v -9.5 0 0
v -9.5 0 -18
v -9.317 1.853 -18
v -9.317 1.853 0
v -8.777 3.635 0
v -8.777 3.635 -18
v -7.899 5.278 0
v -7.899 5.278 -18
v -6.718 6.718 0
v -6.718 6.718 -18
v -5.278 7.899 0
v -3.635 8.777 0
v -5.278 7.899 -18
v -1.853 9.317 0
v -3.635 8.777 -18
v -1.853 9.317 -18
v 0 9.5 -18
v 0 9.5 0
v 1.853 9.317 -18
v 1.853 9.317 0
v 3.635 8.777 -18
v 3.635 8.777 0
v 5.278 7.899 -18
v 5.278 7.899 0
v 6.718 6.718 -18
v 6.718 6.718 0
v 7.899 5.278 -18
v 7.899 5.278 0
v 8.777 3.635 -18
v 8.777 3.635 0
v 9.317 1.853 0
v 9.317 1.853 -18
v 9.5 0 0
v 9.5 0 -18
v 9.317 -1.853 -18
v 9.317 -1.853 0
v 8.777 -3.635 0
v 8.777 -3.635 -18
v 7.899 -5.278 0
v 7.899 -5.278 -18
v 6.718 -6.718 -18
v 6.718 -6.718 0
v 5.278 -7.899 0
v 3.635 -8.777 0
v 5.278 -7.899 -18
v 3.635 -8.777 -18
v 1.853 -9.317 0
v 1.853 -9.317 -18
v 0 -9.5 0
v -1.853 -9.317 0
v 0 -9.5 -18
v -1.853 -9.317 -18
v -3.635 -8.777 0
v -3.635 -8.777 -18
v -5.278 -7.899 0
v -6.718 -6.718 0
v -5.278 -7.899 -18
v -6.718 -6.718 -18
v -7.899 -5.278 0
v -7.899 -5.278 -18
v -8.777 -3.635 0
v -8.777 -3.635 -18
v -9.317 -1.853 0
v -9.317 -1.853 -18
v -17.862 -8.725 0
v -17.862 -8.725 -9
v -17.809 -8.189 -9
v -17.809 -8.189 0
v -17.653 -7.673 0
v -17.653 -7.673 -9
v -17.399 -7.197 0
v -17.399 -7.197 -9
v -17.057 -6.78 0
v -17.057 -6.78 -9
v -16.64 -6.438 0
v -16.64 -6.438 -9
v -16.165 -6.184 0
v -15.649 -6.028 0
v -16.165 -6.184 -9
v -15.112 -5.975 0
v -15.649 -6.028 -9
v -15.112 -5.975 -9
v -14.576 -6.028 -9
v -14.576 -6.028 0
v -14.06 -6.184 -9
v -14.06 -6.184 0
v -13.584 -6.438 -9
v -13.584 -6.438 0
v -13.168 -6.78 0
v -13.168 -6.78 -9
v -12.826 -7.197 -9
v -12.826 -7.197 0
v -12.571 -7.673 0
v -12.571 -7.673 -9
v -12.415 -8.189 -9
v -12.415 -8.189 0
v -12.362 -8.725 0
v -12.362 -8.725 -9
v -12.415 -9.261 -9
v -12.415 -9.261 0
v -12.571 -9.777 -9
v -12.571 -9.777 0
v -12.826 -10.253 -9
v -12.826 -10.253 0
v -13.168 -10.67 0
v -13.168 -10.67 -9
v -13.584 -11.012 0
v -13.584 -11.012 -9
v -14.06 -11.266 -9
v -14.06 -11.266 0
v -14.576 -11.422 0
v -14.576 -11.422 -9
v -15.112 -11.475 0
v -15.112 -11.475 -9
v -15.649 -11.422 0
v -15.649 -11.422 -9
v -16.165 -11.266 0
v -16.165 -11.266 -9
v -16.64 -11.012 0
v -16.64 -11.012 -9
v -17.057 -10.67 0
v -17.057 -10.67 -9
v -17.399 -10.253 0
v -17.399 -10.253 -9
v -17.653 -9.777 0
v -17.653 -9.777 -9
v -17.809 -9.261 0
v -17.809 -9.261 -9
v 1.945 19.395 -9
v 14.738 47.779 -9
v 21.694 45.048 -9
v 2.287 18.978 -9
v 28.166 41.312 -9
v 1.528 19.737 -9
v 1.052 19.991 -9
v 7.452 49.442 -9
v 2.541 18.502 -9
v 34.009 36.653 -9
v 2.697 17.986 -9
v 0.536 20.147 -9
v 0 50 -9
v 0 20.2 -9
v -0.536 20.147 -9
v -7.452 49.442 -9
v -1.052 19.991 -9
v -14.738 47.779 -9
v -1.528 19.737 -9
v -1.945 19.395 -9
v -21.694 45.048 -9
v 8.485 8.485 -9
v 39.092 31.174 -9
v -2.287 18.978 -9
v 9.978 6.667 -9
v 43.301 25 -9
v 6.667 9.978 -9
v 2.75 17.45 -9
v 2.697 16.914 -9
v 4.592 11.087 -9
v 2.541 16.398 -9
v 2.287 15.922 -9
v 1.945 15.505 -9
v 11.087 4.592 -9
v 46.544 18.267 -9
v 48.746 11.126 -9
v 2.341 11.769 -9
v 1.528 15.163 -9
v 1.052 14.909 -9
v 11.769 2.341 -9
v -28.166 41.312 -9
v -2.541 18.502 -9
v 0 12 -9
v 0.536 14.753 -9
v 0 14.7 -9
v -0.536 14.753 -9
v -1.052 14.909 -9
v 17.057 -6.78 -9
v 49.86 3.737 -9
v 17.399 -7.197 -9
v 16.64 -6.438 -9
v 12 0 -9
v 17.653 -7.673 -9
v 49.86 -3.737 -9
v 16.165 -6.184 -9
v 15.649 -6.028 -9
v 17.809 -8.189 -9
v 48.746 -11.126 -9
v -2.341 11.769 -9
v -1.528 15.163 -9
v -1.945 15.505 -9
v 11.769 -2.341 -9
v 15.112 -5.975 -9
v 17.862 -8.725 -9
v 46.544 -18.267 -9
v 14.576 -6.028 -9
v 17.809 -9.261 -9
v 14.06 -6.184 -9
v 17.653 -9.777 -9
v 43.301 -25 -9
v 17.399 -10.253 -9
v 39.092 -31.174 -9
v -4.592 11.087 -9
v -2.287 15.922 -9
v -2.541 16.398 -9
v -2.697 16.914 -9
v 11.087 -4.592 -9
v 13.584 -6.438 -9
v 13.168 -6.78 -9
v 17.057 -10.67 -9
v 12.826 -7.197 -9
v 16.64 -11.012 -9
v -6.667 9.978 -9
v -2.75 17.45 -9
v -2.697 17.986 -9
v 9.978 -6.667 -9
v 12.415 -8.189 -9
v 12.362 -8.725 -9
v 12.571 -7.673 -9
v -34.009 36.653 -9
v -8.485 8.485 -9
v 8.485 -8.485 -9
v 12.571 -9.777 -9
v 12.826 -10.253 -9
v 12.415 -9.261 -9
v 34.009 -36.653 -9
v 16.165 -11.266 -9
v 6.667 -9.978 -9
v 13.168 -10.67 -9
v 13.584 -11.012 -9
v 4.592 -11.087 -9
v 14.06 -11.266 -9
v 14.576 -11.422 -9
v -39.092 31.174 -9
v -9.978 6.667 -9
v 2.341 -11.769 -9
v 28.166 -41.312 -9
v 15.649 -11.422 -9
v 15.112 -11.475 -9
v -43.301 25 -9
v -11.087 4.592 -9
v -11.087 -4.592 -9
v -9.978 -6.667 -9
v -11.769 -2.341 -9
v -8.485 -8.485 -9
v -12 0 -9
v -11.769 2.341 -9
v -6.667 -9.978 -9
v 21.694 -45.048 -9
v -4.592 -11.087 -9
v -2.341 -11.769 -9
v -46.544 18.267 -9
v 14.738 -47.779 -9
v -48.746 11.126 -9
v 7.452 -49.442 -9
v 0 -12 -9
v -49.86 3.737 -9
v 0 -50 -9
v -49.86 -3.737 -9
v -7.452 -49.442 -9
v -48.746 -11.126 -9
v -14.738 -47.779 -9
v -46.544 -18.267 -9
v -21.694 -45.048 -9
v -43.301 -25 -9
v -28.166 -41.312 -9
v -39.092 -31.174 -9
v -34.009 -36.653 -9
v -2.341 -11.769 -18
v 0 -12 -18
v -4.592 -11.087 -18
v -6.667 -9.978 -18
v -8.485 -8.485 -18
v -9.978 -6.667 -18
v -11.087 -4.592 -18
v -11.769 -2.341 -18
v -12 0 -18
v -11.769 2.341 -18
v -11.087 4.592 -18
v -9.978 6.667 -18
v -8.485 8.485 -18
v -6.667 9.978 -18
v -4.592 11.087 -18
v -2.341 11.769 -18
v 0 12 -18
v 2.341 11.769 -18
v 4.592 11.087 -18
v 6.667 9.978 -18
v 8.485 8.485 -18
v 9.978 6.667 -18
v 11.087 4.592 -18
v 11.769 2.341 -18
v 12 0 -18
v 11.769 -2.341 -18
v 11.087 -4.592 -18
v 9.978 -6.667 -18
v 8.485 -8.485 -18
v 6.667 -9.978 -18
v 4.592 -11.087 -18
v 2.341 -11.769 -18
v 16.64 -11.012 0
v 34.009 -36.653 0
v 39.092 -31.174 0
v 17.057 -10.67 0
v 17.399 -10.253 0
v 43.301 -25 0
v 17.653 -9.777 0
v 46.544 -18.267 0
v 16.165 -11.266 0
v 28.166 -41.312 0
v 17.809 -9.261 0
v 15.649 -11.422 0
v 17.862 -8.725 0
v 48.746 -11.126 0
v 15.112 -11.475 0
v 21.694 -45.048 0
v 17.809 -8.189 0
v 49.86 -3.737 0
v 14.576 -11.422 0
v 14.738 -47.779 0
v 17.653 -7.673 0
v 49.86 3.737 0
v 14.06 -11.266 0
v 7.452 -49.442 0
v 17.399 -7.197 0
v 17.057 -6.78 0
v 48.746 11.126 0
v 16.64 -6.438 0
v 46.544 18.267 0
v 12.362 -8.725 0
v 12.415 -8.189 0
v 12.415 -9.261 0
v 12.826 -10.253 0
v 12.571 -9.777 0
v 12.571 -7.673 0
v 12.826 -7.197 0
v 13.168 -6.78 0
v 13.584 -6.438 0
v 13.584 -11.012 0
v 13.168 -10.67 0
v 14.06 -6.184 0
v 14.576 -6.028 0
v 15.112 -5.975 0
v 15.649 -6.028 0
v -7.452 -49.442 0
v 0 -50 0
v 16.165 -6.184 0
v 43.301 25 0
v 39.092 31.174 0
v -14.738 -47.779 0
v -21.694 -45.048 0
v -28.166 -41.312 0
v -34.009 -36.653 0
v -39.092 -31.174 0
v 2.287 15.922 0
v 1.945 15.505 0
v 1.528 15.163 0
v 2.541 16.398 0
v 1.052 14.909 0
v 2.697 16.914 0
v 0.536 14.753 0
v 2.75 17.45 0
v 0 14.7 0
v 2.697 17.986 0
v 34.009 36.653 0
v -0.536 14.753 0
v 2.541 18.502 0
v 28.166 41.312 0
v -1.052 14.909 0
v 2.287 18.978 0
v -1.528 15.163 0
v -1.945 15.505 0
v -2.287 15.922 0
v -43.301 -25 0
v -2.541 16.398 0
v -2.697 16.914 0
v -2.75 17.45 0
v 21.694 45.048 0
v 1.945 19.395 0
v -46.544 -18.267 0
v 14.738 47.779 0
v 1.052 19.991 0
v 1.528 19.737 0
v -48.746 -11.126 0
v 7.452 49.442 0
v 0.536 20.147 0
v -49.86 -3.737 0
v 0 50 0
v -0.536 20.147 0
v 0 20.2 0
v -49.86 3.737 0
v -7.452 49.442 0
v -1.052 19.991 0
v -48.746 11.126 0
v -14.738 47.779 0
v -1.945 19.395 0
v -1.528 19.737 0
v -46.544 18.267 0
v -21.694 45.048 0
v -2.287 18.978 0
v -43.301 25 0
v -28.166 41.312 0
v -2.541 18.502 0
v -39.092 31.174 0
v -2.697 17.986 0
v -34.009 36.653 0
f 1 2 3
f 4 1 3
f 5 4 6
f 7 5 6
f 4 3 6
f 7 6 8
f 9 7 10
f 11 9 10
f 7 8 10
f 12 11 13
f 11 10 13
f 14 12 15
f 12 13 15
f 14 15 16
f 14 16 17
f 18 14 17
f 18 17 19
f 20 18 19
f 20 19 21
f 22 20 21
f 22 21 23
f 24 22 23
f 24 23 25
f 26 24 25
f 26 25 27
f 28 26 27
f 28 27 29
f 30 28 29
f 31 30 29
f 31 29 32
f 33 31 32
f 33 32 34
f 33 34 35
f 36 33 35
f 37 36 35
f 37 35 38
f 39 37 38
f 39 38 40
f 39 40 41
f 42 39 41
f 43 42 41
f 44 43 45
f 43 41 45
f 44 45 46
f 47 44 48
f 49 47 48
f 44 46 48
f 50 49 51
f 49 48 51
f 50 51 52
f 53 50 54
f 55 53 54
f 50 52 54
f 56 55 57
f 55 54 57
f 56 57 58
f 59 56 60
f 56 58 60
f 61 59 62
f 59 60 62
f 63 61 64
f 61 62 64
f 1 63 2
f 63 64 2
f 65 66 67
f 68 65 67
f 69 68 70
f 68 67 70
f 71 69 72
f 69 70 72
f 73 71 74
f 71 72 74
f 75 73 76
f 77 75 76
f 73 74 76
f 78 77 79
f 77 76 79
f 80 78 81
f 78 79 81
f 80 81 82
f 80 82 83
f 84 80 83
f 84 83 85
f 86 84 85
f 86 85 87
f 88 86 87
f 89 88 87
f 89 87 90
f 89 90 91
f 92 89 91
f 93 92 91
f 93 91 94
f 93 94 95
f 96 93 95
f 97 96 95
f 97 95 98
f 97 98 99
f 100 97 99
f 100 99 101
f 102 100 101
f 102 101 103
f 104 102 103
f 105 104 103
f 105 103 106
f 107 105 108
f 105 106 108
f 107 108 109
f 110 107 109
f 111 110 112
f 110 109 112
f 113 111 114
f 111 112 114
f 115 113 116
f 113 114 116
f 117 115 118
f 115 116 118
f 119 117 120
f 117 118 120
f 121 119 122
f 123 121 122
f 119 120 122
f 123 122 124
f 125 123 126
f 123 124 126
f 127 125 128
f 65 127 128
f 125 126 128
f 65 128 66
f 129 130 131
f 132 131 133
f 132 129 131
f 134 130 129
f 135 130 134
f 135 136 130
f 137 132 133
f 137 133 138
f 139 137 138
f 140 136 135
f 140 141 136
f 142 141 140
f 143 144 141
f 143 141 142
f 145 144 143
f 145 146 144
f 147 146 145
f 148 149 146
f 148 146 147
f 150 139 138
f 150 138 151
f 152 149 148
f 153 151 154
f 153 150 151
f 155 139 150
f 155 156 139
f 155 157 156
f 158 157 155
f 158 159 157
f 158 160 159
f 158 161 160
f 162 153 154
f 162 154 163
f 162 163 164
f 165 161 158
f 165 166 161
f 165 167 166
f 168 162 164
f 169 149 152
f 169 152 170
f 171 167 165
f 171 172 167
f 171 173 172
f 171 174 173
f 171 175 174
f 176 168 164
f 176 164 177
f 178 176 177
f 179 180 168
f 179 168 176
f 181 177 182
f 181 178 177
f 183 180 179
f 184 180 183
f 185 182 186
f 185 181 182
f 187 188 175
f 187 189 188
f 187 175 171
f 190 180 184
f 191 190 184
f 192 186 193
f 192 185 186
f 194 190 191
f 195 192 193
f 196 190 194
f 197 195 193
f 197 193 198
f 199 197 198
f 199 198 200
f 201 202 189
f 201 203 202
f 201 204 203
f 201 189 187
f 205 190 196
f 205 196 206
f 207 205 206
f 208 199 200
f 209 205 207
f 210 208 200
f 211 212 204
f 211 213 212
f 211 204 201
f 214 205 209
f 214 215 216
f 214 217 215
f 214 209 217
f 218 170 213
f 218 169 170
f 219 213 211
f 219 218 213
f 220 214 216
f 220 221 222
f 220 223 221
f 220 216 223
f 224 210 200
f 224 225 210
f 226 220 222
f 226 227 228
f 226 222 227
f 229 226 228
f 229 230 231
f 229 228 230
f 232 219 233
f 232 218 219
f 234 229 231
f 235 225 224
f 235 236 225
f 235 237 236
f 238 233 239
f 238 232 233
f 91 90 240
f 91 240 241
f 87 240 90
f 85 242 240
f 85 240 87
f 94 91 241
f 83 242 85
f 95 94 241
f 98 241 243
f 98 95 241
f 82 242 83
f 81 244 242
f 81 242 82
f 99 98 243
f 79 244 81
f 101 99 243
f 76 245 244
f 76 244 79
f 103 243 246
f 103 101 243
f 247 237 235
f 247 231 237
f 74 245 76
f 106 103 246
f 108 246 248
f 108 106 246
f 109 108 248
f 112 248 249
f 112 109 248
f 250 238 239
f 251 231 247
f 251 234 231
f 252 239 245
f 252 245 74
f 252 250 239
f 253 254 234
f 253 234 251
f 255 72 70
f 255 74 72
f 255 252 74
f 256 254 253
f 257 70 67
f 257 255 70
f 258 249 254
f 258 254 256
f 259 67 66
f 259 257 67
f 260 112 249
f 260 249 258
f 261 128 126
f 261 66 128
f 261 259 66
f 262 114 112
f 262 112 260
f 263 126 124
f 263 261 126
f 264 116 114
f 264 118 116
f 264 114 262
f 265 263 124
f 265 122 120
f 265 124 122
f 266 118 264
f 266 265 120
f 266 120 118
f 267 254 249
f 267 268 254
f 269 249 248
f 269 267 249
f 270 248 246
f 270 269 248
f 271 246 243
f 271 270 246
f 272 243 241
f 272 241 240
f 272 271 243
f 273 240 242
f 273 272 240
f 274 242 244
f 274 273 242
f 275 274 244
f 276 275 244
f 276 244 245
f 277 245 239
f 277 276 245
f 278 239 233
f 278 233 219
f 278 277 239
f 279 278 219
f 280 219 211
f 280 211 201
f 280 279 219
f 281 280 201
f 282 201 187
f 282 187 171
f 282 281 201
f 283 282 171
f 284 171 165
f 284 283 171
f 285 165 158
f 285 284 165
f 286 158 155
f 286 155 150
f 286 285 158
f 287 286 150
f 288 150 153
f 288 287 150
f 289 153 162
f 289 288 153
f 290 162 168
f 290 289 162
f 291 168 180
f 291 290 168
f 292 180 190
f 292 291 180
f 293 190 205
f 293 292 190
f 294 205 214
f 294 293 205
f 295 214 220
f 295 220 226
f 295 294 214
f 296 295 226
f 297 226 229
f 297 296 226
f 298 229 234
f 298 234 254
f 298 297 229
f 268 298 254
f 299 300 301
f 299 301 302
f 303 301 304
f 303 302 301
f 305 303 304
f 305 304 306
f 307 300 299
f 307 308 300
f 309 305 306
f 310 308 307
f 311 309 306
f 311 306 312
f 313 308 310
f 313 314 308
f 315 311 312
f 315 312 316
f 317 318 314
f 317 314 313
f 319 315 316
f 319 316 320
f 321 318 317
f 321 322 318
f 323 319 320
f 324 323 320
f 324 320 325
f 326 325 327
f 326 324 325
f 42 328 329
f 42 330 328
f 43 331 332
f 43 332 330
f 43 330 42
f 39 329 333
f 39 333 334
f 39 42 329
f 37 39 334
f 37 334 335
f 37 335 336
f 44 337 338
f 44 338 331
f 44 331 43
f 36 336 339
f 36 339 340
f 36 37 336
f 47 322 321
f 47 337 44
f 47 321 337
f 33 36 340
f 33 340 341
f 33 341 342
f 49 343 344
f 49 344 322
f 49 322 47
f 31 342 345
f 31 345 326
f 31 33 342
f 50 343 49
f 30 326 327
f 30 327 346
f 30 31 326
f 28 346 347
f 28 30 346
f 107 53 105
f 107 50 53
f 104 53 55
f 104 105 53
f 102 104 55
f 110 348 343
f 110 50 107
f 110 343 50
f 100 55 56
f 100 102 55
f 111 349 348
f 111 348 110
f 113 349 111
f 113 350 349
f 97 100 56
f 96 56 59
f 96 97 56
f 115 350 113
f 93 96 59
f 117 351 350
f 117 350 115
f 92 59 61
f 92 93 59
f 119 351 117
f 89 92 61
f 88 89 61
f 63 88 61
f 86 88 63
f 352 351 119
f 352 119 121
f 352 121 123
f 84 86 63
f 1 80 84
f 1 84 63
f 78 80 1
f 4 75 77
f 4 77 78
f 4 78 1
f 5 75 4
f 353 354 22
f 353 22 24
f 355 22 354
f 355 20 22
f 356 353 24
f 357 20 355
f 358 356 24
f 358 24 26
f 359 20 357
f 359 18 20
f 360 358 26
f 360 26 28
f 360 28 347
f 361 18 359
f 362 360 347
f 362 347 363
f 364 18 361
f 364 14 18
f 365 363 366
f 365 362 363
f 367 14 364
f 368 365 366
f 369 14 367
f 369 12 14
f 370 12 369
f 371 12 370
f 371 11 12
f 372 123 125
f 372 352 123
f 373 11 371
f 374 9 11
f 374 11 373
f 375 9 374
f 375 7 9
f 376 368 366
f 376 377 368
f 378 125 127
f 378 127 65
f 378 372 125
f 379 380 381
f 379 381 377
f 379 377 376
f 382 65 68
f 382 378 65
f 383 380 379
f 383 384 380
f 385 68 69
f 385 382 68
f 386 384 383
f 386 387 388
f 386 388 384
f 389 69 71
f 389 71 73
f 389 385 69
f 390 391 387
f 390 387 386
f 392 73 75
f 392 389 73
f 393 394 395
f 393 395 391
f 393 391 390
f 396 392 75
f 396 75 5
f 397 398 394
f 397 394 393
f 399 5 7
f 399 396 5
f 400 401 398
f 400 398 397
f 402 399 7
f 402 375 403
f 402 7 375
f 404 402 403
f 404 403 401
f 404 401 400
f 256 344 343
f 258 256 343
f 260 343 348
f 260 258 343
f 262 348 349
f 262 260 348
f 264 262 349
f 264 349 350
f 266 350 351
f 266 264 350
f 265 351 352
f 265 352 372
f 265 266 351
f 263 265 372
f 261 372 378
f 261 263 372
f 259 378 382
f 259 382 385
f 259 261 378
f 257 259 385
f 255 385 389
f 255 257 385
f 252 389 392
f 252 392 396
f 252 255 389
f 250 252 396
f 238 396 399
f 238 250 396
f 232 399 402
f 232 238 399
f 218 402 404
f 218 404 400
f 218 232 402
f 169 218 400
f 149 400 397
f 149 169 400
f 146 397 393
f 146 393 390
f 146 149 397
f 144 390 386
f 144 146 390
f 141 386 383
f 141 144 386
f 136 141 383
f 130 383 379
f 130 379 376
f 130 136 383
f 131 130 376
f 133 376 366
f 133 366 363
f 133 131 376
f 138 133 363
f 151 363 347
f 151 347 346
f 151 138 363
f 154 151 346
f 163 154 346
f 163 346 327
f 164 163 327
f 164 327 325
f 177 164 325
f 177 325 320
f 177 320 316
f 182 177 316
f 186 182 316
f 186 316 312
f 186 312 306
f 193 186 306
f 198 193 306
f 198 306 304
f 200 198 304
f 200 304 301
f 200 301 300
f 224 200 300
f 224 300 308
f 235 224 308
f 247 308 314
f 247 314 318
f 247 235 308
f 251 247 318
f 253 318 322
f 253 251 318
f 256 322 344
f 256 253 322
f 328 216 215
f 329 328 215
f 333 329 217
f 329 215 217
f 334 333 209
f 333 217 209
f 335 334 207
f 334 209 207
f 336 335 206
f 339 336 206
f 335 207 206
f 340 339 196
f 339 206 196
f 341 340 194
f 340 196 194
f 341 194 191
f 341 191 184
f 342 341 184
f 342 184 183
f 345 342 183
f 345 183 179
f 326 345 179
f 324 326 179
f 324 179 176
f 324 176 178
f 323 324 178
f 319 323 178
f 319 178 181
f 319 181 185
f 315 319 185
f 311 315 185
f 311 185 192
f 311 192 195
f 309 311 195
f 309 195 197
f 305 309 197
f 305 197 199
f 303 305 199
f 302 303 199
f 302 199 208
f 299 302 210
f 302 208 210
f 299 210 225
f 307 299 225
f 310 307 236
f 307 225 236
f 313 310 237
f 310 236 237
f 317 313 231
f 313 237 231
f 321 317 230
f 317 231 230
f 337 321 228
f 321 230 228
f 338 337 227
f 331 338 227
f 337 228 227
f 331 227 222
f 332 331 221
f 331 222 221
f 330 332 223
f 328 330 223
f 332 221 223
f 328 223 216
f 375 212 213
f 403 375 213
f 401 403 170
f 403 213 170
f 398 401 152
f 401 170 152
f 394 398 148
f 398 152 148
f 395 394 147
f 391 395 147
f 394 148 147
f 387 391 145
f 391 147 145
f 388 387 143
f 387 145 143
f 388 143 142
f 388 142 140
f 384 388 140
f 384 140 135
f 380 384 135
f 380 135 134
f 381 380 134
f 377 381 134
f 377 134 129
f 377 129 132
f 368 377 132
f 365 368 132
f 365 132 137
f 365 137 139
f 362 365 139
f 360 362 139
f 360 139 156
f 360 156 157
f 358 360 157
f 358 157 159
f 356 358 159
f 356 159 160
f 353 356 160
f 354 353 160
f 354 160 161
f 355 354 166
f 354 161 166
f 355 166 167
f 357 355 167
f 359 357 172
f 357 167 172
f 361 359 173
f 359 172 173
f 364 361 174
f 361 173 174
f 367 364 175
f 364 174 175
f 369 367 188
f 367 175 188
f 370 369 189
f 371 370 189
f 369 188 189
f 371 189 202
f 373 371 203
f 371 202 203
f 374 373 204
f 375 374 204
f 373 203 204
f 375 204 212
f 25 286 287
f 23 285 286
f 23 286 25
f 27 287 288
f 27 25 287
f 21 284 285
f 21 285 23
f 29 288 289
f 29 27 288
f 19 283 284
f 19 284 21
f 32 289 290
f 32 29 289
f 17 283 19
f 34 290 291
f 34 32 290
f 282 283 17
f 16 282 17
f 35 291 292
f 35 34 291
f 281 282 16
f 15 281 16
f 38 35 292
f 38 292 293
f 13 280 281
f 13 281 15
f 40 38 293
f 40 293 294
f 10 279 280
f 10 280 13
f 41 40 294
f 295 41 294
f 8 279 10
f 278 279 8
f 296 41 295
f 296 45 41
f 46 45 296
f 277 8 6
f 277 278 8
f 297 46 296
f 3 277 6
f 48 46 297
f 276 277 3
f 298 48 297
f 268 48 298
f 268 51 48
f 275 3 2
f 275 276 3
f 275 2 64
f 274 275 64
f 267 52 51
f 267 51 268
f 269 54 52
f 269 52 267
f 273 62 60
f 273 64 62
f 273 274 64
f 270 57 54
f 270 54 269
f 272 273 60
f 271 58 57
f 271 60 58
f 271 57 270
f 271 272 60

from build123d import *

# Parameters (mm, degrees)
F3_D = 19
F5_D = 5.5


with BuildPart() as f1:
    # F0 (on Right) → F1 (revolve)
    with BuildSketch(Plane.YZ):
        Polygon((-6, -18), (-6, 0), (-50, 0), (-50, -9), (-12, -9), (-12, -18), align=None)
    revolve(axis=Axis((0, 0, -9.1057028621), (0, 0, -1)))

    # F3 (through all)
    with Locations(Plane.XY):
        with Locations((0, 0)):
            Hole(F3_D / 2)

    # F5 (through all)
    with Locations(Plane.XY):
        with Locations((-15.112143296, -8.725), (0, 17.45), (15.112143296, -8.725)):
            Hole(F5_D / 2)


solid = f1.part
